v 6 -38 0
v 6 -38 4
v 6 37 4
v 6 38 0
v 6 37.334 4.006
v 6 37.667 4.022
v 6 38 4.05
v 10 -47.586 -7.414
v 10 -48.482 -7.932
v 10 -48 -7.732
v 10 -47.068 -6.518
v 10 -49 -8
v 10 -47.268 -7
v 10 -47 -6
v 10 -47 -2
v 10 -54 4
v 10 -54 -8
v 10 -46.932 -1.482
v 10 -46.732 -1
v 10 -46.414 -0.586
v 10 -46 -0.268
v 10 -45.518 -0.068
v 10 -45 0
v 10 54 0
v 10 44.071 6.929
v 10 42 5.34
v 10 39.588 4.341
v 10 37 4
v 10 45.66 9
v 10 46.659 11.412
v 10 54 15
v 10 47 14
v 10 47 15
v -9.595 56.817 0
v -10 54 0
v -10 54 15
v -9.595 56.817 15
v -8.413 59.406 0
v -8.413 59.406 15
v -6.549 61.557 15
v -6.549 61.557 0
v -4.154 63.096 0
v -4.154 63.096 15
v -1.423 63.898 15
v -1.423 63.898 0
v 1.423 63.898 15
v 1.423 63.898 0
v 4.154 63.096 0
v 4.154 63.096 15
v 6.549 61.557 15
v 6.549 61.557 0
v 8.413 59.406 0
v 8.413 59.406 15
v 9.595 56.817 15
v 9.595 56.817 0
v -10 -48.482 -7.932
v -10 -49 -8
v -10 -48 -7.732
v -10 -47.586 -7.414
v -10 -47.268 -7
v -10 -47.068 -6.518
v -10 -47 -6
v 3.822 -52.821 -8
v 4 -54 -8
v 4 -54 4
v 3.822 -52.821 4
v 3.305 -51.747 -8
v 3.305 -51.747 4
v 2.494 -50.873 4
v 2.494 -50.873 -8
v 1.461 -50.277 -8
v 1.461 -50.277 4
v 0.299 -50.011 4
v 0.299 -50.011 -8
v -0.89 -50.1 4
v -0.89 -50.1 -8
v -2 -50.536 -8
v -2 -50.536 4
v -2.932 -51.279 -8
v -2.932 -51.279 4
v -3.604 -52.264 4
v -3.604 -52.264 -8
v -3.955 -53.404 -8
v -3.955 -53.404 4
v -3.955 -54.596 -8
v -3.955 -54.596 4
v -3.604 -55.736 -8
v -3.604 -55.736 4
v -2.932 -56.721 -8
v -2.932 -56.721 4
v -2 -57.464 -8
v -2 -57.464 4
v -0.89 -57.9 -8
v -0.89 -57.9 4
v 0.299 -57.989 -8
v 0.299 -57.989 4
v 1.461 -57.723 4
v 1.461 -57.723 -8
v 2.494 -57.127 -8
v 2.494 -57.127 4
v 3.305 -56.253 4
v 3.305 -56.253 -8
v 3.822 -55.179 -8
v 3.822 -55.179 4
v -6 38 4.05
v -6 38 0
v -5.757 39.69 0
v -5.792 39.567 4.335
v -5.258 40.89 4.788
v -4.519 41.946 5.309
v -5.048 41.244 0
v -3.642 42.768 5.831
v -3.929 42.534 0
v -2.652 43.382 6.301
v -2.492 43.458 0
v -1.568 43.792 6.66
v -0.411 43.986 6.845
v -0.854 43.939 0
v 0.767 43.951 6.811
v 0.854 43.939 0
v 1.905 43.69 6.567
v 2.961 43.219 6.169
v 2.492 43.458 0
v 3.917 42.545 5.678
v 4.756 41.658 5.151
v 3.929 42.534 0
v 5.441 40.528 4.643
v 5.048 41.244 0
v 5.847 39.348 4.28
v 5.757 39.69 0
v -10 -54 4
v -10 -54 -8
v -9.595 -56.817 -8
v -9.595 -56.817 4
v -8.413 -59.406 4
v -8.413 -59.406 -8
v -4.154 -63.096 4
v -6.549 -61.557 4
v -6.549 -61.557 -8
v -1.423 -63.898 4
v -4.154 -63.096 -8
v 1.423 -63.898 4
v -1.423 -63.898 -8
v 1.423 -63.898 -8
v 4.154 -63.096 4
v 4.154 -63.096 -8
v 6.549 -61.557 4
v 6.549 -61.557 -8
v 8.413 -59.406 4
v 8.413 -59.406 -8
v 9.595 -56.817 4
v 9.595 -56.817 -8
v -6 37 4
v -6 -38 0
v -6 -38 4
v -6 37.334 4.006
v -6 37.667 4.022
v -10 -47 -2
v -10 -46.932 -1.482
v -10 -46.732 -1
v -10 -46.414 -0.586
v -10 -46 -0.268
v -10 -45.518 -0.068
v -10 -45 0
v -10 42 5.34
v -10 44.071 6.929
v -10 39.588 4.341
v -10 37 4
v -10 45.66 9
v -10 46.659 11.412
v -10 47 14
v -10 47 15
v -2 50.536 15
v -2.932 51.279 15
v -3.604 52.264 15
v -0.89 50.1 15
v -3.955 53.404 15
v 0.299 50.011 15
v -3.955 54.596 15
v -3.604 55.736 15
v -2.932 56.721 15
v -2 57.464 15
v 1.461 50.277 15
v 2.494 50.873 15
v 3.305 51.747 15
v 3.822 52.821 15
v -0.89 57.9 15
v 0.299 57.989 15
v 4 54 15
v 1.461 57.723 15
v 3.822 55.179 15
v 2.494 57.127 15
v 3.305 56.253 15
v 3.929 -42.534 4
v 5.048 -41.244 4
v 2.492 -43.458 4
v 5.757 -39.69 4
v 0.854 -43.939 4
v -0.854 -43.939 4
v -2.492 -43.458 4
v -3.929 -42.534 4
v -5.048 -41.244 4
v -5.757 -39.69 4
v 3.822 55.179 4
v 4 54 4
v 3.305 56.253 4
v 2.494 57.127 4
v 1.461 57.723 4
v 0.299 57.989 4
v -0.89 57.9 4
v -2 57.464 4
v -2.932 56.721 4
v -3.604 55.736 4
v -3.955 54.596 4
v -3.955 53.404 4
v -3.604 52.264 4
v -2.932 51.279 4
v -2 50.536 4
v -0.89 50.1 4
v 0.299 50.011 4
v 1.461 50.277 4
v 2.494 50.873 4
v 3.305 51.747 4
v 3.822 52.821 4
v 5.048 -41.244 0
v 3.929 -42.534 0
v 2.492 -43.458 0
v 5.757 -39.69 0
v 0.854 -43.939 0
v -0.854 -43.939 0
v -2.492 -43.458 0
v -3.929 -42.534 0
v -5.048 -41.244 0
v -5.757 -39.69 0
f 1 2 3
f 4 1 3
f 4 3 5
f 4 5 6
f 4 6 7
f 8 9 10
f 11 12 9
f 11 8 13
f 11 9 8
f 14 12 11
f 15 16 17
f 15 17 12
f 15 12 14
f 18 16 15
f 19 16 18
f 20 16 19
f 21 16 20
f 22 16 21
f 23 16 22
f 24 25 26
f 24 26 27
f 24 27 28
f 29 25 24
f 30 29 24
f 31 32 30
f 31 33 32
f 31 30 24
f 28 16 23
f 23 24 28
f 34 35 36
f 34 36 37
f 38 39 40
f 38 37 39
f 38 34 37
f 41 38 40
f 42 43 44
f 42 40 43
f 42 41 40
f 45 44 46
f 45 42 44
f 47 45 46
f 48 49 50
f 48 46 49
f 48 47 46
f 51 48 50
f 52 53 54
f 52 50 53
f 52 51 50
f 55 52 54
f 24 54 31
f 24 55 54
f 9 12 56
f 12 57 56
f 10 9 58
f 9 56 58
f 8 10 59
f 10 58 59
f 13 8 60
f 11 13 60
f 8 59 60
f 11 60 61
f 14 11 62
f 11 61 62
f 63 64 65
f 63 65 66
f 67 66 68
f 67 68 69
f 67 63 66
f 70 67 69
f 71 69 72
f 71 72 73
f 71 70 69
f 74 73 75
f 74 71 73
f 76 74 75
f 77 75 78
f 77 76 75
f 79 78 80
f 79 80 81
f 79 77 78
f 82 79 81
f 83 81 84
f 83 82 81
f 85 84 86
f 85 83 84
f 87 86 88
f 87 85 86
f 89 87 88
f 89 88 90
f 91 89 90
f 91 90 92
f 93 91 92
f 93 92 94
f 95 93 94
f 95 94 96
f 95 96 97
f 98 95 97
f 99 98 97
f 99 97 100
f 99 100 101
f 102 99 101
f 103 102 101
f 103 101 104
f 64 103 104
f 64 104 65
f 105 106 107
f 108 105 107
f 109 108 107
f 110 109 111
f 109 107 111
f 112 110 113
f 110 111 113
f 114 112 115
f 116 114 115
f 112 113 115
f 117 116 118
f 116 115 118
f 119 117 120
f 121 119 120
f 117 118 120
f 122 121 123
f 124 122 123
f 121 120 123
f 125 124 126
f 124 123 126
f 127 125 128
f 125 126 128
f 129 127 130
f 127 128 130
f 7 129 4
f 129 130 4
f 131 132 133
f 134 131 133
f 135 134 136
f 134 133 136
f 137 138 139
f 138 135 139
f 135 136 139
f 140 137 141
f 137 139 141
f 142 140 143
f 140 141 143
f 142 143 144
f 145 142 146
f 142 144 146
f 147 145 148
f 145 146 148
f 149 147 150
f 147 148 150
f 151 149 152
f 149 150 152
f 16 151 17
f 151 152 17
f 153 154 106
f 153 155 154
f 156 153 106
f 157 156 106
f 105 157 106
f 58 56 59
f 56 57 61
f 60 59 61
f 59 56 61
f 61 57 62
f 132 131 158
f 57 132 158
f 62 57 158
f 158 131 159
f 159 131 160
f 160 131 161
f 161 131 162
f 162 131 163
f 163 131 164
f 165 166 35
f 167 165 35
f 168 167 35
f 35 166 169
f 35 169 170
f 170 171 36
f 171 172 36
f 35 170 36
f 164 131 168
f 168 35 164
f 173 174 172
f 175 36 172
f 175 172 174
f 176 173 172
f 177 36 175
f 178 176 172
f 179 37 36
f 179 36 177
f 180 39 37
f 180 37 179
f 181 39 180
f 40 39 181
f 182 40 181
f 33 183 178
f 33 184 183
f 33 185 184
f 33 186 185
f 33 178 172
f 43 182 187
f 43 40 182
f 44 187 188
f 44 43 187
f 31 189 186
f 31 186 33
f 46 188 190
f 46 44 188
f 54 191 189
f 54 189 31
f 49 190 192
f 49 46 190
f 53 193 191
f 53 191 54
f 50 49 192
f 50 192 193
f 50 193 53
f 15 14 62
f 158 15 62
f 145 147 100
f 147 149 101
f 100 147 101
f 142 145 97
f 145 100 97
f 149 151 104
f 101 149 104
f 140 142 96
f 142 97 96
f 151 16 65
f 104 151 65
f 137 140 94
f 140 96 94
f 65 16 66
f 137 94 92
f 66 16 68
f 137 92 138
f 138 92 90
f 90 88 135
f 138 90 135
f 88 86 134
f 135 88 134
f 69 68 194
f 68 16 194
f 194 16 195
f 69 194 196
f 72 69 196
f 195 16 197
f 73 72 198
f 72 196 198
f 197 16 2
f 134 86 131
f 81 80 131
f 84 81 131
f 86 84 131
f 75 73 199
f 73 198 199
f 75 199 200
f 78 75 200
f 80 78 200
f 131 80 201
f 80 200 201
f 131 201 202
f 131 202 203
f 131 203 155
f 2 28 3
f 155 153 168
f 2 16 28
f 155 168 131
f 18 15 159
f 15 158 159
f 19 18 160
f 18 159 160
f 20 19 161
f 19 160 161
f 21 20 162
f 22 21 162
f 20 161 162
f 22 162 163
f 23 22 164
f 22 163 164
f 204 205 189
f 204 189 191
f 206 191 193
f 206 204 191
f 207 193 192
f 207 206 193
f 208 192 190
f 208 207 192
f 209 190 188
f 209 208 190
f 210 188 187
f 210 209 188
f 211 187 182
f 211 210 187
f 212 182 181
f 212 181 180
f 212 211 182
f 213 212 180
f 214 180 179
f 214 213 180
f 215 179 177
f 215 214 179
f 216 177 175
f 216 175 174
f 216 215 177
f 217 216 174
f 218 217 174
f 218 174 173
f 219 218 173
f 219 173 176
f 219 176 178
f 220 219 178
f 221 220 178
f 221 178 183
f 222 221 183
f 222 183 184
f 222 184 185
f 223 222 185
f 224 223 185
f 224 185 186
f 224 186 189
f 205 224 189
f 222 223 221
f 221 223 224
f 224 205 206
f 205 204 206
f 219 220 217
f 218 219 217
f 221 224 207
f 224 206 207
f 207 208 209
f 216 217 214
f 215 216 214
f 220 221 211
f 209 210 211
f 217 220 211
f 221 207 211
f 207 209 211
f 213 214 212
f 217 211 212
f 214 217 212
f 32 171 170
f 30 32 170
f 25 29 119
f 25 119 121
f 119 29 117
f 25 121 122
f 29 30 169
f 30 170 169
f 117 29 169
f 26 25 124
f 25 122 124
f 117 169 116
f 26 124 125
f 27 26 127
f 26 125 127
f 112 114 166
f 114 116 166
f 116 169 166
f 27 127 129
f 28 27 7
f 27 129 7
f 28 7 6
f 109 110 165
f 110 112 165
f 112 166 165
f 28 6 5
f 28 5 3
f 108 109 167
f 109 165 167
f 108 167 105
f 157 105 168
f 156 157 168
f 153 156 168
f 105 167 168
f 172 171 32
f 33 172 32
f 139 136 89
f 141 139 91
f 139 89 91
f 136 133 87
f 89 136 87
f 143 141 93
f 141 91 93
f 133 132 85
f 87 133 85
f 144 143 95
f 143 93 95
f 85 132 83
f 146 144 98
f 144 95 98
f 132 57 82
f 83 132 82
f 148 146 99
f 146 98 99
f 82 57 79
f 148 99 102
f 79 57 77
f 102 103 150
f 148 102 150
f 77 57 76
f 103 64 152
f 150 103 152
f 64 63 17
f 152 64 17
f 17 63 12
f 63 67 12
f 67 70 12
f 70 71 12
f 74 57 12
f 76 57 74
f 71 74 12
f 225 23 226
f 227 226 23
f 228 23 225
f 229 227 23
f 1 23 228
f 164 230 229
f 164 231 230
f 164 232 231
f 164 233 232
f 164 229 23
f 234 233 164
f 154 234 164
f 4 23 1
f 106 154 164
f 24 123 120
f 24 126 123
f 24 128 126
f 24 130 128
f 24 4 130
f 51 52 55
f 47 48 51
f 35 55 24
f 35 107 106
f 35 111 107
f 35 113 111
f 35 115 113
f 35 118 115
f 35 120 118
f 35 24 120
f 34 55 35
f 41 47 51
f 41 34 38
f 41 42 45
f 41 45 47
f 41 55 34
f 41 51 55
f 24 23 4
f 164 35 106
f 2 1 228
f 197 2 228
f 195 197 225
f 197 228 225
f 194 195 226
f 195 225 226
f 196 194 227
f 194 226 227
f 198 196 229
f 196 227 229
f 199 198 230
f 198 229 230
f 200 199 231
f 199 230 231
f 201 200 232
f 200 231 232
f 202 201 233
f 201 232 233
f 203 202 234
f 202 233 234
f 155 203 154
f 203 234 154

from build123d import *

# Parameters (mm, degrees)
CROQUIS1_R              = 4
SALIENTE_EXTRUIR1_DEPTH = 4
SALIENTE_EXTRUIR2_START = -8
CROQUIS1_5_R            = 4
SALIENTE_EXTRUIR2_DEPTH = 8
REDONDEO2_R             = 2
CROQUIS1_6_R            = 4
SALIENTE_EXTRUIR3_DEPTH = 15
REDONDEO1_START         = -10
REDONDEO1_DEPTH         = 4
REDONDEO1_START_2       = 6
REDONDEO1_2_DEPTH       = 4
REDONDEO1_START_3       = 4
REDONDEO1_3_DEPTH       = 10
REDONDEO1_START_4       = -6
REDONDEO1_4_DEPTH       = 12


with BuildPart() as part:
    # Croquis1 → Saliente-Extruir1 (new body)
    with BuildSketch(Plane.XY):
        with BuildLine():
            Line((10, 54), (10, -54))
            ThreePointArc((10, -54), (0, -64), (-10, -54))
            Line((-10, -54), (-10, 54))
            ThreePointArc((-10, 54), (0, 64), (10, 54))
        make_face()
        with Locations((0, -54)):
            Circle(CROQUIS1_R, mode=Mode.SUBTRACT)
        with BuildLine():
            Line((6, 38), (6, -38))
            ThreePointArc((6, -38), (0, -44), (-6, -38))
            Line((-6, -38), (-6, 38))
            ThreePointArc((-6, 38), (0, 44), (6, 38))
        make_face(mode=Mode.SUBTRACT)
    extrude(amount=SALIENTE_EXTRUIR1_DEPTH)

    # Croquis1<5> → Saliente-Extruir2 (add)
    with BuildSketch(Plane.XY.offset(SALIENTE_EXTRUIR2_START)):
        with BuildLine():
            Line((10, -54), (10, -47))
            Line((10, -47), (-10, -47))
            Line((-10, -47), (-10, -54))
            ThreePointArc((-10, -54), (0, -64), (10, -54))
        make_face()
        with Locations((0, -54)):
            Circle(CROQUIS1_5_R, mode=Mode.SUBTRACT)
    extrude(amount=SALIENTE_EXTRUIR2_DEPTH)

    # Redondeo2
    redondeo2_edges = [part.edges().sort_by_distance(p)[0] for p in [
        (0, -47, 0),
        (0, -47, -8),
    ]]
    fillet(redondeo2_edges, radius=REDONDEO2_R)

    # Croquis1<6> → Saliente-Extruir3 (add)
    with BuildSketch(Plane.XY):
        with BuildLine():
            Line((10, 47), (10, 54))
            ThreePointArc((10, 54), (0, 64), (-10, 54))
            Line((-10, 54), (-10, 47))
            Line((-10, 47), (10, 47))
        make_face()
        with Locations((0, 54)):
            Circle(CROQUIS1_6_R, mode=Mode.SUBTRACT)
    extrude(amount=SALIENTE_EXTRUIR3_DEPTH)

    # Redondeo1: read off the stored shape, not the designer's step
    # Redondeo1 outline → Redondeo1 (add)
    with BuildSketch(Plane.YZ.offset(REDONDEO1_START)):
        with BuildLine():
            Line((47, 4), (47, 14))
            ThreePointArc((47, 14), (44.071067812, 6.928932188), (37, 4))
            Line((37, 4), (47, 4))
        make_face()
    extrude(amount=REDONDEO1_DEPTH)

    # Redondeo1 2 outline → Redondeo1 2 (add)
    with BuildSketch(Plane.YZ.offset(REDONDEO1_START_2)):
        with BuildLine():
            Line((47, 4), (47, 14))
            ThreePointArc((47, 14), (44.071067812, 6.928932188), (37, 4))
            Line((37, 4), (47, 4))
        make_face()
    extrude(amount=REDONDEO1_2_DEPTH)

    # Redondeo1 3 outline → Redondeo1 3 (add)
    with BuildSketch(Plane.XY.offset(REDONDEO1_START_3)):
        with BuildLine():
            Line((-6, 47), (-6, 38))
            ThreePointArc((-6, 38), (0, 44), (6, 38))
            Line((6, 38), (6, 47))
            Line((6, 47), (-6, 47))
        make_face()
    extrude(amount=REDONDEO1_3_DEPTH)

    # Redondeo1 4 outline → Redondeo1 4 (cut)
    with BuildSketch(Plane.YZ.offset(REDONDEO1_START_4)):
        with BuildLine():
            ThreePointArc((37, 4), (44.071067812, 6.928932188), (47, 14))
            Line((47, 14), (37, 14))
            Line((37, 14), (37, 4))
        make_face()
    extrude(amount=REDONDEO1_4_DEPTH, mode=Mode.SUBTRACT)


solid = part.part
